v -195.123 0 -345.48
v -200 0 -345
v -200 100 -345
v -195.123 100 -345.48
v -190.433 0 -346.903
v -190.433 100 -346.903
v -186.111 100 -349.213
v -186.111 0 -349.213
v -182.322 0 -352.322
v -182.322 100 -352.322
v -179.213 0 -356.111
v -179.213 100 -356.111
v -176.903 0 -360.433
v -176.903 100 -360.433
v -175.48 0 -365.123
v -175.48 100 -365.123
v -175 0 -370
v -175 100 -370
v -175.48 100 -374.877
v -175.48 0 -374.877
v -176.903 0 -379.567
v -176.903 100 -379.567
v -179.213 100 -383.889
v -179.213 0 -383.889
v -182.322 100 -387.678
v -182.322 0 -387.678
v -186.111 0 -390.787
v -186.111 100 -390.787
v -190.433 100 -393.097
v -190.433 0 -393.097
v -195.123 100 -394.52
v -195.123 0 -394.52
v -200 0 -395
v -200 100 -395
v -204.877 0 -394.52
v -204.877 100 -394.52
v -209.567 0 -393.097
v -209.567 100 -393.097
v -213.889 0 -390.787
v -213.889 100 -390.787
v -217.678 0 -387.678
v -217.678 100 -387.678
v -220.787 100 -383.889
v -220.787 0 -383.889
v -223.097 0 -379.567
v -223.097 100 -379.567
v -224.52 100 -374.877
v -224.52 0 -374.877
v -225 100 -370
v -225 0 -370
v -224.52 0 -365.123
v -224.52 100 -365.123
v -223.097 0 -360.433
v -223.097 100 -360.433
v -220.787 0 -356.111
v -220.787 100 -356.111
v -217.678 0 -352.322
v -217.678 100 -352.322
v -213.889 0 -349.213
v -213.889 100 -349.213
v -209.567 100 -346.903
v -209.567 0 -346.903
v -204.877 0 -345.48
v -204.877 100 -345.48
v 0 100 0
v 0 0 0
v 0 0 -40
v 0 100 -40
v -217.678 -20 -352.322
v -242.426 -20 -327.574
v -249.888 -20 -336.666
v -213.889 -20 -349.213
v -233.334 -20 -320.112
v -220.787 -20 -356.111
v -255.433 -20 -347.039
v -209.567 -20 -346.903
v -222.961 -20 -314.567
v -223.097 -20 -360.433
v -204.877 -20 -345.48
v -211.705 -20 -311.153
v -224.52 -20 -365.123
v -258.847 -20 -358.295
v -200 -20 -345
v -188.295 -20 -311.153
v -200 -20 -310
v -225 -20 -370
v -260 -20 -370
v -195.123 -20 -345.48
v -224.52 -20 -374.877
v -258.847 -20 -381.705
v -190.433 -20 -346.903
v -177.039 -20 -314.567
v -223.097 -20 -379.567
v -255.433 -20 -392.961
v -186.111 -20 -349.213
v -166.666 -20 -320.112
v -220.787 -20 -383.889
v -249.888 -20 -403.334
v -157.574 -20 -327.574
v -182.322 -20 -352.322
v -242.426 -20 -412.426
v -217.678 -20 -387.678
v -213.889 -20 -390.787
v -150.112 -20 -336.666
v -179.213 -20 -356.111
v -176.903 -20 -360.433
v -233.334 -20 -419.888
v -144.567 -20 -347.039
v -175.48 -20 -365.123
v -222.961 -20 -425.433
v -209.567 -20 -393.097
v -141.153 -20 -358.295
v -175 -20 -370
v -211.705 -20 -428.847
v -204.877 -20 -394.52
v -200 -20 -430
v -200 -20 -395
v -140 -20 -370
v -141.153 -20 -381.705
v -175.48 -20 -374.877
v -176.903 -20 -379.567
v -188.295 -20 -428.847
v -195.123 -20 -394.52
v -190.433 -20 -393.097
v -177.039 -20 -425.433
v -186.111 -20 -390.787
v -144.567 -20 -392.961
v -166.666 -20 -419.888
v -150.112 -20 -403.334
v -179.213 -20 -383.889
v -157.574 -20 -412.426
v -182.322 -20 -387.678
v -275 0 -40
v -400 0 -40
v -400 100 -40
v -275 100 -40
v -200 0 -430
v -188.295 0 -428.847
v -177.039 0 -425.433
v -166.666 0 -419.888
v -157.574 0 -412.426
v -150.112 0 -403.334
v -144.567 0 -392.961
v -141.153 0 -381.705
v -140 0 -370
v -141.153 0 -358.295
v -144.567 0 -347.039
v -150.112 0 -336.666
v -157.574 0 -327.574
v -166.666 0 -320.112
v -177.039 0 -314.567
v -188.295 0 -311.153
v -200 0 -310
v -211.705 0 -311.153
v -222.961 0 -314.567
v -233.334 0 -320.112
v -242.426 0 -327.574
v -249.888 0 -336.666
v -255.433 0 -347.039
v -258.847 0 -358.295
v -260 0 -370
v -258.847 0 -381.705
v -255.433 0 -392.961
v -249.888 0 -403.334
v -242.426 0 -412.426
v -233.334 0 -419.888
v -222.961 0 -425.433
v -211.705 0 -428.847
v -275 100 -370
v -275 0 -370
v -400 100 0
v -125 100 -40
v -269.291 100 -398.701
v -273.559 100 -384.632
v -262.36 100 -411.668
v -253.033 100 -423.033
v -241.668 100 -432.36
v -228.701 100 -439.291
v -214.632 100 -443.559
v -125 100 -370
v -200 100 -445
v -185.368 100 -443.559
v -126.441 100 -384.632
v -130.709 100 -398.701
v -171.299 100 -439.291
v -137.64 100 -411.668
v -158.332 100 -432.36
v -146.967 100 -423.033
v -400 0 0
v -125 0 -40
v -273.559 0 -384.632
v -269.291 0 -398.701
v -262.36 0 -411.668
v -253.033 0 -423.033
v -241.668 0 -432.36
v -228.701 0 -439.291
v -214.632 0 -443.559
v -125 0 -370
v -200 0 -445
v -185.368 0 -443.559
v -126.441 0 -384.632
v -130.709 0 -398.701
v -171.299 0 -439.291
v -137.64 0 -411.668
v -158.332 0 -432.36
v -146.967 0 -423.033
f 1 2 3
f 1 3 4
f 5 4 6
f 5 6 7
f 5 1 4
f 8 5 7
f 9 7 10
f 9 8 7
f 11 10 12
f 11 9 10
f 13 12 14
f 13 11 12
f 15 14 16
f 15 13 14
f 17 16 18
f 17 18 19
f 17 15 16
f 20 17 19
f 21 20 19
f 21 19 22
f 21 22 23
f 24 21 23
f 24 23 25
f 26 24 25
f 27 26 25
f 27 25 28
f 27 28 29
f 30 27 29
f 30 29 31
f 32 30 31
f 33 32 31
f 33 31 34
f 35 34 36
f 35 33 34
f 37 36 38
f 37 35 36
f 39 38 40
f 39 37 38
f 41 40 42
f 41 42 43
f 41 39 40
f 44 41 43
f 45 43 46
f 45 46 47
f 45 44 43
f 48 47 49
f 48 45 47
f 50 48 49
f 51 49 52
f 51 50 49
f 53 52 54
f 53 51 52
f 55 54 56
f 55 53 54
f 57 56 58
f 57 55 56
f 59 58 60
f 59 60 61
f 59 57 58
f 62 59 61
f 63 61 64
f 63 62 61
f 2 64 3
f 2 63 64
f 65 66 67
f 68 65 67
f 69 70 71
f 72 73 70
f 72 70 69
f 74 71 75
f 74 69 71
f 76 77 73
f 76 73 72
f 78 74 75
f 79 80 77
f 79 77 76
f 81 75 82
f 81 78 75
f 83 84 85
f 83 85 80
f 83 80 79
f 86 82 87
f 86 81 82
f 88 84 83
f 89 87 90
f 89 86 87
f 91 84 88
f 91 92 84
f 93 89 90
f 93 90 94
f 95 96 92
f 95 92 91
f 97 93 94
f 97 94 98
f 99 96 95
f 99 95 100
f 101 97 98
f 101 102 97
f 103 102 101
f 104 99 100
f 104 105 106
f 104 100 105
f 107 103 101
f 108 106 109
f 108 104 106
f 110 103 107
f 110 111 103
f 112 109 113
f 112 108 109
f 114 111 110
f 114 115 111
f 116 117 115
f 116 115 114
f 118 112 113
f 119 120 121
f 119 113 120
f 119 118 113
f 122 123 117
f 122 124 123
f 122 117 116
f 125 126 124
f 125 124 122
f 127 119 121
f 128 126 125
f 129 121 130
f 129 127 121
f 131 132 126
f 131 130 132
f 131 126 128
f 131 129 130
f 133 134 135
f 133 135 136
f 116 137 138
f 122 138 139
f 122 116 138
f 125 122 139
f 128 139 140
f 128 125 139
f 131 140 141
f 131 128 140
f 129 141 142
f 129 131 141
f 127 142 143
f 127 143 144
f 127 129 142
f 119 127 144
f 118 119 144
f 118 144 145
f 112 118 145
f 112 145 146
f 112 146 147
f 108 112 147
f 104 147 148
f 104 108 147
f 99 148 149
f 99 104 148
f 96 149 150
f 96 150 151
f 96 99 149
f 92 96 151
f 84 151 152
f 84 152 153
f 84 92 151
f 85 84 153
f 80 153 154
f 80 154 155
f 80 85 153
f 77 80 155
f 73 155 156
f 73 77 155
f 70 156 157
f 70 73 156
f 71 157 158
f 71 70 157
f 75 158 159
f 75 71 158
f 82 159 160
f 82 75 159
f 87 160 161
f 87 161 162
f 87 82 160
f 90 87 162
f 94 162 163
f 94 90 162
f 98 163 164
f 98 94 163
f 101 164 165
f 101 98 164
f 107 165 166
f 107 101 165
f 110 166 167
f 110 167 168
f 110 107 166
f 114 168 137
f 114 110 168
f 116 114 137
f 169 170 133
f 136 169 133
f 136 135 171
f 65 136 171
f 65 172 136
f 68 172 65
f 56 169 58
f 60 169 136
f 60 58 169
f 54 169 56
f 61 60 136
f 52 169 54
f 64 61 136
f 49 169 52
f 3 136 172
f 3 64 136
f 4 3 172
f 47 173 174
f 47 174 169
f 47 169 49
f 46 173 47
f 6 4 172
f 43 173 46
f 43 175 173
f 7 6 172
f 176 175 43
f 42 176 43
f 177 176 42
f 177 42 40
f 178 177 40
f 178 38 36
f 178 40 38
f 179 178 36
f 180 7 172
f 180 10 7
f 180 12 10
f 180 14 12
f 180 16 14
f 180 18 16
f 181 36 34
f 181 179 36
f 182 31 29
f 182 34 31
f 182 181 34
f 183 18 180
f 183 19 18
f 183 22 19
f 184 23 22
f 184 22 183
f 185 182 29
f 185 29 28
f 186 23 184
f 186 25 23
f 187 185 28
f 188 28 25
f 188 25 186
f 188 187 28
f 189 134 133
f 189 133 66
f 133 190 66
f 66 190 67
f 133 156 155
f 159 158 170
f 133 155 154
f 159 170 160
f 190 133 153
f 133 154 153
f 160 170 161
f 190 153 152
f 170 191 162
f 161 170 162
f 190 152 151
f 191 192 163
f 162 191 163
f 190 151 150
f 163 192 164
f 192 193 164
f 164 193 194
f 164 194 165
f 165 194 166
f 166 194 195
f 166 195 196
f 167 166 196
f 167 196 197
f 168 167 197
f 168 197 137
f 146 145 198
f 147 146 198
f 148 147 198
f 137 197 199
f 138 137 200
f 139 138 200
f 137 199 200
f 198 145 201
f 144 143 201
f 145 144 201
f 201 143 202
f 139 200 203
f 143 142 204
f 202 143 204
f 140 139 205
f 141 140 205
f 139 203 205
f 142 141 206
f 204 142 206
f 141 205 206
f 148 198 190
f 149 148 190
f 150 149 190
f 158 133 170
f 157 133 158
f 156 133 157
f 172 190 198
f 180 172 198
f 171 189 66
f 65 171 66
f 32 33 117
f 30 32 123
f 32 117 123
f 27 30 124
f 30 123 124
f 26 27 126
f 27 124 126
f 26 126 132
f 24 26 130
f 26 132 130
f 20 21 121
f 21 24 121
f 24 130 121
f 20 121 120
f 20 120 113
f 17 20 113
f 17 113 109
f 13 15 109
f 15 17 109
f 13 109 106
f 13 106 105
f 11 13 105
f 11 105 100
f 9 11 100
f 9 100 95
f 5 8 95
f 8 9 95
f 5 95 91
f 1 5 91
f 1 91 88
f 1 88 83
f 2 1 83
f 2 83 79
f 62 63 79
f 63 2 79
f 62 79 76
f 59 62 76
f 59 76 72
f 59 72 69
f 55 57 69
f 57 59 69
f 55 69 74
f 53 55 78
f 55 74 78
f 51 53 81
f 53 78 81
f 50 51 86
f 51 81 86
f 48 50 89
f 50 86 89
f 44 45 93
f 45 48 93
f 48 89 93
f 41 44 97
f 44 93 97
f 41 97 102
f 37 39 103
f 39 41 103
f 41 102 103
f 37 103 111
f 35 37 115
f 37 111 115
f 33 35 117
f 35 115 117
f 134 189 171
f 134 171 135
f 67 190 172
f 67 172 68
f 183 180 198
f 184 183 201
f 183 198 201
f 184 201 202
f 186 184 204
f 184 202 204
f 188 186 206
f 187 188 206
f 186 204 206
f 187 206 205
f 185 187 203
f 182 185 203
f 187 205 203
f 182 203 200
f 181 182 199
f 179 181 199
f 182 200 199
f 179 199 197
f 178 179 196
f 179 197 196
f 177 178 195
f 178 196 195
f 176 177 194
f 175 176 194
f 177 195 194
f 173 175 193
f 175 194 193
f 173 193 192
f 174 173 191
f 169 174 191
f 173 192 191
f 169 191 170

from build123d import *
from build123d.topology import SkipClean

# Parameters (mm, degrees)
CROQUIS2_R              = 75
CROQUIS2_R_2            = 25
CROQUIS2_W              = 400
CROQUIS2_H              = 40
SALIENTE_EXTRUIR1_DEPTH = 100
SALIENTE_EXTRUIR2_START = 20
CROQUIS3_R              = 60
CROQUIS3_R_2            = 25
SALIENTE_EXTRUIR2_DEPTH = 20


with BuildPart() as part:
    # Croquis2 → Saliente-Extruir1 (new body)
    # profile 1 of 3: a face of its own
    with BuildSketch(Plane(origin=(0, 0, 0), x_dir=(1, 0, 0), z_dir=(0, 1, 0))):
        with Locations((-200, 370)):
            Circle(CROQUIS2_R)
        with Locations(Location((-200, 370, 0), (0, 0, 270))):
            Circle(CROQUIS2_R_2, mode=Mode.SUBTRACT)
    # profile 2 of 3: a face of its own
    with BuildSketch(Plane(origin=(0, 0, 0), x_dir=(1, 0, 0), z_dir=(0, 1, 0))):
        with BuildLine():
            Line((-275, 345), (-275, 40))
            Line((-275, 40), (-200, 40))
            Line((-200, 40), (-125, 40))
            Line((-125, 40), (-125, 345))
            Line((-125, 345), (-125, 370))
            ThreePointArc((-125, 370), (-200, 295), (-275, 370))
            Line((-275, 370), (-275, 345))
        make_face()
    # profile 3 of 3: a face of its own
    with BuildSketch(Plane(origin=(0, 0, 0), x_dir=(1, 0, 0), z_dir=(0, 1, 0))):
        with Locations((-200, 20)):
            Rectangle(CROQUIS2_W, CROQUIS2_H)
    extrude(amount=SALIENTE_EXTRUIR1_DEPTH)

    # Croquis3 → Saliente-Extruir2 (add)
    with SkipClean():  # the faces are left unmerged after this step: merging them gives an invalid solid
        with BuildSketch(Plane(origin=(0, 0, 0), x_dir=(-1, 0, 0), z_dir=(0, -1, 0)).offset(SALIENTE_EXTRUIR2_START)):
            with Locations(Location((200, 370, 0), (0, 0, 90))):
                Circle(CROQUIS3_R)
            with Locations(Location((200, 370, 0), (0, 0, 90))):
                Circle(CROQUIS3_R_2, mode=Mode.SUBTRACT)
        extrude(amount=-SALIENTE_EXTRUIR2_DEPTH)


solid = part.part
